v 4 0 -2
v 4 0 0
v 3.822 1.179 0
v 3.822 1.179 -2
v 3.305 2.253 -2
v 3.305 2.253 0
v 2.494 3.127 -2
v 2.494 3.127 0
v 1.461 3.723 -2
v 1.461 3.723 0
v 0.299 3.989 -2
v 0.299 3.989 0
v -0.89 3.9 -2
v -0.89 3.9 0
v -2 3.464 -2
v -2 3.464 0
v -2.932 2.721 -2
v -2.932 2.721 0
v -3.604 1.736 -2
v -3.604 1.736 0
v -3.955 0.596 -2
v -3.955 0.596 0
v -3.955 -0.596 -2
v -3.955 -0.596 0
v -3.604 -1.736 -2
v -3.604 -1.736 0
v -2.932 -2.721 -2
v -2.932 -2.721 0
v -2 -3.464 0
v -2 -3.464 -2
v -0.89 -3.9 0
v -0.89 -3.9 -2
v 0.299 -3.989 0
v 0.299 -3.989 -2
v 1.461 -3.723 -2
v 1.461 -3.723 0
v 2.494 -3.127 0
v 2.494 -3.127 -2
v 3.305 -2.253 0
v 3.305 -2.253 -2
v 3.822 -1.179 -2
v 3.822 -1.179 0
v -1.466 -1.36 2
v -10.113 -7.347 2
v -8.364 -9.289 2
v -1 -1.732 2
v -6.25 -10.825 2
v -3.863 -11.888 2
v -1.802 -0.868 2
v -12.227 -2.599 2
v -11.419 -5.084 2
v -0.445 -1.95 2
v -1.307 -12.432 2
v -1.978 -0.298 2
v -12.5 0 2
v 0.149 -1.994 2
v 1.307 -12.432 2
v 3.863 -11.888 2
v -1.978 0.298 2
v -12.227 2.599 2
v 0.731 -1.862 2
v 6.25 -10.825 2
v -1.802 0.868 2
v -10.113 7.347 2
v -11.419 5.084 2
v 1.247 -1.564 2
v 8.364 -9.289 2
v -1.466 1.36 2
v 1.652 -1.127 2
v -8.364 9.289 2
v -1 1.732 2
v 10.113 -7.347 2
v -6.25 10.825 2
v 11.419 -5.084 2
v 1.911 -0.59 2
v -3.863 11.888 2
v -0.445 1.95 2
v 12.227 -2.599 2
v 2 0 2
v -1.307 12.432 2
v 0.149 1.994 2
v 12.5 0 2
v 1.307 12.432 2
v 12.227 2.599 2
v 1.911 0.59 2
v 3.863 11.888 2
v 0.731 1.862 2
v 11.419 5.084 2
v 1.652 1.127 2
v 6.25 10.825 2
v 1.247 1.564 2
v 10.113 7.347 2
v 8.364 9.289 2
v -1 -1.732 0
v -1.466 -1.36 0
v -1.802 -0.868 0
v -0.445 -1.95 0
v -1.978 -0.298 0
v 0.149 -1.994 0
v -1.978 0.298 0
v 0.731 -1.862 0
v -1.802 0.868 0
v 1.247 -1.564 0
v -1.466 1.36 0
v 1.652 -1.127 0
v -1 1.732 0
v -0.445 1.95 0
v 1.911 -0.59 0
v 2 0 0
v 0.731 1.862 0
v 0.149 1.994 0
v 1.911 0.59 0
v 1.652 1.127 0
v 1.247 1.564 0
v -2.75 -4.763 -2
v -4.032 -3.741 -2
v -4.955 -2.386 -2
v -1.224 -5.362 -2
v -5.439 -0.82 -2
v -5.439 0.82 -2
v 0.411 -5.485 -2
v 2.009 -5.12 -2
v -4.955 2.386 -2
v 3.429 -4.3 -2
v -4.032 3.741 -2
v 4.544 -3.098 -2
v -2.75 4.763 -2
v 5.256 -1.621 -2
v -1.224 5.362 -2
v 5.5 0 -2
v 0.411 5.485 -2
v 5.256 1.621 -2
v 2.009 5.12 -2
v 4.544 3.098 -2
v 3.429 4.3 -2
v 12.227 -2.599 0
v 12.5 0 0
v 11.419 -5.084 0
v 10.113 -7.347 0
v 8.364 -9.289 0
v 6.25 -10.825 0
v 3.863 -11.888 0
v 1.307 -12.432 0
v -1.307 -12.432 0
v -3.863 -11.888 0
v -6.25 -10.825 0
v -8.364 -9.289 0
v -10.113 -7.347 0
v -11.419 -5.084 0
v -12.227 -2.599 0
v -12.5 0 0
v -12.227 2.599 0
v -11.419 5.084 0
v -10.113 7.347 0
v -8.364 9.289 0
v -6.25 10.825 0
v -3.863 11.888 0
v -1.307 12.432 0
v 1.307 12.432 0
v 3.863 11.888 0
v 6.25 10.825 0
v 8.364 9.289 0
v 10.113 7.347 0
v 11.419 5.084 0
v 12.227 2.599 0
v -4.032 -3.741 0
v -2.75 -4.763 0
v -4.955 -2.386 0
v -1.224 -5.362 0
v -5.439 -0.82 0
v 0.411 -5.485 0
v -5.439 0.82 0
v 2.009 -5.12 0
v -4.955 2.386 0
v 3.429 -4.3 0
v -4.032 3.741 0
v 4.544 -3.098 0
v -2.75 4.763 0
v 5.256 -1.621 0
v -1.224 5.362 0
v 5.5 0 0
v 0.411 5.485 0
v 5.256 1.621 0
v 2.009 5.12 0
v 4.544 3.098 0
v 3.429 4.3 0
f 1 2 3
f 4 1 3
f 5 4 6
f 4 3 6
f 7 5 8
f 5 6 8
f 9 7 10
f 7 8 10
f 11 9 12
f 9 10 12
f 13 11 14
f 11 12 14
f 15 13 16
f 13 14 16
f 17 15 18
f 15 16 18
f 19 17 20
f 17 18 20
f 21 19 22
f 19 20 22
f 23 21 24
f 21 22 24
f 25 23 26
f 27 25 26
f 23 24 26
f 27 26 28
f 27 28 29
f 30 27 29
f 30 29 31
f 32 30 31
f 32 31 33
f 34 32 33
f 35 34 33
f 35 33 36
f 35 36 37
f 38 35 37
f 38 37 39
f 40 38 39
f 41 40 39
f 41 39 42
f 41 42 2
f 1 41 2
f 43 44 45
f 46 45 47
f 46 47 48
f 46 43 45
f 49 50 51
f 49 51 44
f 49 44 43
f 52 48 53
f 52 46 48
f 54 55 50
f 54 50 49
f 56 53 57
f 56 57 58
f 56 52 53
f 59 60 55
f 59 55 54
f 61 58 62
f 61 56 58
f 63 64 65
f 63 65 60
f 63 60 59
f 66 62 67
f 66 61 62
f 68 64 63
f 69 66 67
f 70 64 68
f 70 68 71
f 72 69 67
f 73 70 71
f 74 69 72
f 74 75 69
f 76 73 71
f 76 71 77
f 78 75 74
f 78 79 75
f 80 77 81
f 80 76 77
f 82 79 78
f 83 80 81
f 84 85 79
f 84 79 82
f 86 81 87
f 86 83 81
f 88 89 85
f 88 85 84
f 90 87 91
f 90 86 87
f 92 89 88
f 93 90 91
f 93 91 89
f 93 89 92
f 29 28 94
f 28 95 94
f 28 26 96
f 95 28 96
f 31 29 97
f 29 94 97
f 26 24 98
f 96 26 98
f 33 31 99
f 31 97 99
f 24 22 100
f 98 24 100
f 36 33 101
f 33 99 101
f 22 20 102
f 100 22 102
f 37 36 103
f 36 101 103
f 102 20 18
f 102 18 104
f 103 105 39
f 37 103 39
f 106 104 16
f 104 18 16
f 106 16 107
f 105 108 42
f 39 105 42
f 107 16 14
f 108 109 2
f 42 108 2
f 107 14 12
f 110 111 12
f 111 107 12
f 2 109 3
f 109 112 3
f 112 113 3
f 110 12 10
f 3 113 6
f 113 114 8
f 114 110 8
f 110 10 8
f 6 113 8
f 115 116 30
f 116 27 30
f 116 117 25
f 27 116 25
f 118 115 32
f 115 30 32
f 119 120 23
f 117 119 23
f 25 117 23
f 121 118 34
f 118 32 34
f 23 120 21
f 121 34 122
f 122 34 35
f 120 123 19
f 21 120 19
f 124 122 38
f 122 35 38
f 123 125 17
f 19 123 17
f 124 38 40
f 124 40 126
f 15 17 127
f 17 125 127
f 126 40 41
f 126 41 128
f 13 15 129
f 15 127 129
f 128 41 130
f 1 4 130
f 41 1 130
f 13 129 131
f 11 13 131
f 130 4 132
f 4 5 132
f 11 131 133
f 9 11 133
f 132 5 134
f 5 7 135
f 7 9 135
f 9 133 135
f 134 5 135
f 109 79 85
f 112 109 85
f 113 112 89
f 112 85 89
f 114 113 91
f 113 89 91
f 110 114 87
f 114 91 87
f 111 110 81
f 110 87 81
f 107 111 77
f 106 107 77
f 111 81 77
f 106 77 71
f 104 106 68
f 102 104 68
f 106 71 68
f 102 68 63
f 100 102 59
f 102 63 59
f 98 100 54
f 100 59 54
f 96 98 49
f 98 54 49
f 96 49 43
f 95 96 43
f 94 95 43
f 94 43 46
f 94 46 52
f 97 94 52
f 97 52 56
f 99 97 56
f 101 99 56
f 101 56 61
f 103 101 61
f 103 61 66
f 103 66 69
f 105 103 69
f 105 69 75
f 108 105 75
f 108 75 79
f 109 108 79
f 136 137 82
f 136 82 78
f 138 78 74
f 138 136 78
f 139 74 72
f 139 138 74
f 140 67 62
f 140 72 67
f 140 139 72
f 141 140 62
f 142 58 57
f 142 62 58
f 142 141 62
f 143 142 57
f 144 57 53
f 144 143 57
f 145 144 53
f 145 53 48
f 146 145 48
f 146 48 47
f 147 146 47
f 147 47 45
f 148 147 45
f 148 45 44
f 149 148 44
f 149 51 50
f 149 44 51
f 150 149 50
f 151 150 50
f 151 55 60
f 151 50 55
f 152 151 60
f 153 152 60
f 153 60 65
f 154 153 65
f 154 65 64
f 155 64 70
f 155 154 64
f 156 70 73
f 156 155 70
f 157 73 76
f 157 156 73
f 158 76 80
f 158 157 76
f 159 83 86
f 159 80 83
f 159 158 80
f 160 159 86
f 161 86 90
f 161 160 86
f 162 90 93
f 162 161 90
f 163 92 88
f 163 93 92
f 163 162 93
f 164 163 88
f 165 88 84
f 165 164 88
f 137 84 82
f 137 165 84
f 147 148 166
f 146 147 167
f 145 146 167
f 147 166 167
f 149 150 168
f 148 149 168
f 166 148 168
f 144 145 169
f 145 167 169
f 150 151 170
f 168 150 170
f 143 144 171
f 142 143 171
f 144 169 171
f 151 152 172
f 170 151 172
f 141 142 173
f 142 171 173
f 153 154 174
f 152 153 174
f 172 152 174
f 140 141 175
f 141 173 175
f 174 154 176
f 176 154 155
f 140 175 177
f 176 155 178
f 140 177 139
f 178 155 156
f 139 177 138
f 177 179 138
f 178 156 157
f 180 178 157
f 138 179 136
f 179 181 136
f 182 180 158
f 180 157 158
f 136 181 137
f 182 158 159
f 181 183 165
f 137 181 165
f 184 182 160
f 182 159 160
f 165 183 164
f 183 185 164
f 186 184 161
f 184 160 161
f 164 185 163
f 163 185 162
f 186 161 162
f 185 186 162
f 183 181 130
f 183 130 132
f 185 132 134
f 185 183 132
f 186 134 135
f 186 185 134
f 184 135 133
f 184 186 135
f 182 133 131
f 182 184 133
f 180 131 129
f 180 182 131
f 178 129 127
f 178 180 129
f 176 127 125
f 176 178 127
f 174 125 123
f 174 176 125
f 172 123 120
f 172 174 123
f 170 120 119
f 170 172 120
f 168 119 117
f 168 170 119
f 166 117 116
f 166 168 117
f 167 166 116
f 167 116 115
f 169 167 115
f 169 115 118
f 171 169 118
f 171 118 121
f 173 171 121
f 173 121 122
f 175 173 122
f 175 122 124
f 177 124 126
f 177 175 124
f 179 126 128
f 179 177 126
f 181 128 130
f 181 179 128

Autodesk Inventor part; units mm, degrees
ref_plane "YZ Plane" through (0, 0, 0) normal (1, 0, 0) x (0, 1, 0)
ref_plane "XZ Plane" through (0, 0, 0) normal (0, 1, 0) x (-1, 0, 0)
ref_plane "XY Plane" through (0, 0, 0) normal (0, 0, 1) x (1, 0, 0)
sketch "Sketch1" plane through (0, 0, 0) normal (0, 0, 1) x (1, 0, 0)
  circle A0 centre (0, 0) radius 12.5
  circle A1 centre (0, 0) radius 4
  circle A2 centre (0, 0) radius 5.5
  dimension "d0" = 25
  dimension "d1" = 8
  dimension "d2" = 11
extrude "Extrusion1" add sketch "Sketch1" against normal blind 2 contours A2
extrude "Extrusion2" add sketch "Sketch1" along normal blind 2 contours A0 | A1 | A2
sketch "Sketch2" plane through (0, 0, 2) normal (0, 0, 1) x (1, 0, 0)
  circle A0 centre (0, 0) radius 2
  dimension "d7" = 4
extrude "Extrusion3" cut sketch "Sketch2" against normal up to next
properties part number "Stepper Cap"
